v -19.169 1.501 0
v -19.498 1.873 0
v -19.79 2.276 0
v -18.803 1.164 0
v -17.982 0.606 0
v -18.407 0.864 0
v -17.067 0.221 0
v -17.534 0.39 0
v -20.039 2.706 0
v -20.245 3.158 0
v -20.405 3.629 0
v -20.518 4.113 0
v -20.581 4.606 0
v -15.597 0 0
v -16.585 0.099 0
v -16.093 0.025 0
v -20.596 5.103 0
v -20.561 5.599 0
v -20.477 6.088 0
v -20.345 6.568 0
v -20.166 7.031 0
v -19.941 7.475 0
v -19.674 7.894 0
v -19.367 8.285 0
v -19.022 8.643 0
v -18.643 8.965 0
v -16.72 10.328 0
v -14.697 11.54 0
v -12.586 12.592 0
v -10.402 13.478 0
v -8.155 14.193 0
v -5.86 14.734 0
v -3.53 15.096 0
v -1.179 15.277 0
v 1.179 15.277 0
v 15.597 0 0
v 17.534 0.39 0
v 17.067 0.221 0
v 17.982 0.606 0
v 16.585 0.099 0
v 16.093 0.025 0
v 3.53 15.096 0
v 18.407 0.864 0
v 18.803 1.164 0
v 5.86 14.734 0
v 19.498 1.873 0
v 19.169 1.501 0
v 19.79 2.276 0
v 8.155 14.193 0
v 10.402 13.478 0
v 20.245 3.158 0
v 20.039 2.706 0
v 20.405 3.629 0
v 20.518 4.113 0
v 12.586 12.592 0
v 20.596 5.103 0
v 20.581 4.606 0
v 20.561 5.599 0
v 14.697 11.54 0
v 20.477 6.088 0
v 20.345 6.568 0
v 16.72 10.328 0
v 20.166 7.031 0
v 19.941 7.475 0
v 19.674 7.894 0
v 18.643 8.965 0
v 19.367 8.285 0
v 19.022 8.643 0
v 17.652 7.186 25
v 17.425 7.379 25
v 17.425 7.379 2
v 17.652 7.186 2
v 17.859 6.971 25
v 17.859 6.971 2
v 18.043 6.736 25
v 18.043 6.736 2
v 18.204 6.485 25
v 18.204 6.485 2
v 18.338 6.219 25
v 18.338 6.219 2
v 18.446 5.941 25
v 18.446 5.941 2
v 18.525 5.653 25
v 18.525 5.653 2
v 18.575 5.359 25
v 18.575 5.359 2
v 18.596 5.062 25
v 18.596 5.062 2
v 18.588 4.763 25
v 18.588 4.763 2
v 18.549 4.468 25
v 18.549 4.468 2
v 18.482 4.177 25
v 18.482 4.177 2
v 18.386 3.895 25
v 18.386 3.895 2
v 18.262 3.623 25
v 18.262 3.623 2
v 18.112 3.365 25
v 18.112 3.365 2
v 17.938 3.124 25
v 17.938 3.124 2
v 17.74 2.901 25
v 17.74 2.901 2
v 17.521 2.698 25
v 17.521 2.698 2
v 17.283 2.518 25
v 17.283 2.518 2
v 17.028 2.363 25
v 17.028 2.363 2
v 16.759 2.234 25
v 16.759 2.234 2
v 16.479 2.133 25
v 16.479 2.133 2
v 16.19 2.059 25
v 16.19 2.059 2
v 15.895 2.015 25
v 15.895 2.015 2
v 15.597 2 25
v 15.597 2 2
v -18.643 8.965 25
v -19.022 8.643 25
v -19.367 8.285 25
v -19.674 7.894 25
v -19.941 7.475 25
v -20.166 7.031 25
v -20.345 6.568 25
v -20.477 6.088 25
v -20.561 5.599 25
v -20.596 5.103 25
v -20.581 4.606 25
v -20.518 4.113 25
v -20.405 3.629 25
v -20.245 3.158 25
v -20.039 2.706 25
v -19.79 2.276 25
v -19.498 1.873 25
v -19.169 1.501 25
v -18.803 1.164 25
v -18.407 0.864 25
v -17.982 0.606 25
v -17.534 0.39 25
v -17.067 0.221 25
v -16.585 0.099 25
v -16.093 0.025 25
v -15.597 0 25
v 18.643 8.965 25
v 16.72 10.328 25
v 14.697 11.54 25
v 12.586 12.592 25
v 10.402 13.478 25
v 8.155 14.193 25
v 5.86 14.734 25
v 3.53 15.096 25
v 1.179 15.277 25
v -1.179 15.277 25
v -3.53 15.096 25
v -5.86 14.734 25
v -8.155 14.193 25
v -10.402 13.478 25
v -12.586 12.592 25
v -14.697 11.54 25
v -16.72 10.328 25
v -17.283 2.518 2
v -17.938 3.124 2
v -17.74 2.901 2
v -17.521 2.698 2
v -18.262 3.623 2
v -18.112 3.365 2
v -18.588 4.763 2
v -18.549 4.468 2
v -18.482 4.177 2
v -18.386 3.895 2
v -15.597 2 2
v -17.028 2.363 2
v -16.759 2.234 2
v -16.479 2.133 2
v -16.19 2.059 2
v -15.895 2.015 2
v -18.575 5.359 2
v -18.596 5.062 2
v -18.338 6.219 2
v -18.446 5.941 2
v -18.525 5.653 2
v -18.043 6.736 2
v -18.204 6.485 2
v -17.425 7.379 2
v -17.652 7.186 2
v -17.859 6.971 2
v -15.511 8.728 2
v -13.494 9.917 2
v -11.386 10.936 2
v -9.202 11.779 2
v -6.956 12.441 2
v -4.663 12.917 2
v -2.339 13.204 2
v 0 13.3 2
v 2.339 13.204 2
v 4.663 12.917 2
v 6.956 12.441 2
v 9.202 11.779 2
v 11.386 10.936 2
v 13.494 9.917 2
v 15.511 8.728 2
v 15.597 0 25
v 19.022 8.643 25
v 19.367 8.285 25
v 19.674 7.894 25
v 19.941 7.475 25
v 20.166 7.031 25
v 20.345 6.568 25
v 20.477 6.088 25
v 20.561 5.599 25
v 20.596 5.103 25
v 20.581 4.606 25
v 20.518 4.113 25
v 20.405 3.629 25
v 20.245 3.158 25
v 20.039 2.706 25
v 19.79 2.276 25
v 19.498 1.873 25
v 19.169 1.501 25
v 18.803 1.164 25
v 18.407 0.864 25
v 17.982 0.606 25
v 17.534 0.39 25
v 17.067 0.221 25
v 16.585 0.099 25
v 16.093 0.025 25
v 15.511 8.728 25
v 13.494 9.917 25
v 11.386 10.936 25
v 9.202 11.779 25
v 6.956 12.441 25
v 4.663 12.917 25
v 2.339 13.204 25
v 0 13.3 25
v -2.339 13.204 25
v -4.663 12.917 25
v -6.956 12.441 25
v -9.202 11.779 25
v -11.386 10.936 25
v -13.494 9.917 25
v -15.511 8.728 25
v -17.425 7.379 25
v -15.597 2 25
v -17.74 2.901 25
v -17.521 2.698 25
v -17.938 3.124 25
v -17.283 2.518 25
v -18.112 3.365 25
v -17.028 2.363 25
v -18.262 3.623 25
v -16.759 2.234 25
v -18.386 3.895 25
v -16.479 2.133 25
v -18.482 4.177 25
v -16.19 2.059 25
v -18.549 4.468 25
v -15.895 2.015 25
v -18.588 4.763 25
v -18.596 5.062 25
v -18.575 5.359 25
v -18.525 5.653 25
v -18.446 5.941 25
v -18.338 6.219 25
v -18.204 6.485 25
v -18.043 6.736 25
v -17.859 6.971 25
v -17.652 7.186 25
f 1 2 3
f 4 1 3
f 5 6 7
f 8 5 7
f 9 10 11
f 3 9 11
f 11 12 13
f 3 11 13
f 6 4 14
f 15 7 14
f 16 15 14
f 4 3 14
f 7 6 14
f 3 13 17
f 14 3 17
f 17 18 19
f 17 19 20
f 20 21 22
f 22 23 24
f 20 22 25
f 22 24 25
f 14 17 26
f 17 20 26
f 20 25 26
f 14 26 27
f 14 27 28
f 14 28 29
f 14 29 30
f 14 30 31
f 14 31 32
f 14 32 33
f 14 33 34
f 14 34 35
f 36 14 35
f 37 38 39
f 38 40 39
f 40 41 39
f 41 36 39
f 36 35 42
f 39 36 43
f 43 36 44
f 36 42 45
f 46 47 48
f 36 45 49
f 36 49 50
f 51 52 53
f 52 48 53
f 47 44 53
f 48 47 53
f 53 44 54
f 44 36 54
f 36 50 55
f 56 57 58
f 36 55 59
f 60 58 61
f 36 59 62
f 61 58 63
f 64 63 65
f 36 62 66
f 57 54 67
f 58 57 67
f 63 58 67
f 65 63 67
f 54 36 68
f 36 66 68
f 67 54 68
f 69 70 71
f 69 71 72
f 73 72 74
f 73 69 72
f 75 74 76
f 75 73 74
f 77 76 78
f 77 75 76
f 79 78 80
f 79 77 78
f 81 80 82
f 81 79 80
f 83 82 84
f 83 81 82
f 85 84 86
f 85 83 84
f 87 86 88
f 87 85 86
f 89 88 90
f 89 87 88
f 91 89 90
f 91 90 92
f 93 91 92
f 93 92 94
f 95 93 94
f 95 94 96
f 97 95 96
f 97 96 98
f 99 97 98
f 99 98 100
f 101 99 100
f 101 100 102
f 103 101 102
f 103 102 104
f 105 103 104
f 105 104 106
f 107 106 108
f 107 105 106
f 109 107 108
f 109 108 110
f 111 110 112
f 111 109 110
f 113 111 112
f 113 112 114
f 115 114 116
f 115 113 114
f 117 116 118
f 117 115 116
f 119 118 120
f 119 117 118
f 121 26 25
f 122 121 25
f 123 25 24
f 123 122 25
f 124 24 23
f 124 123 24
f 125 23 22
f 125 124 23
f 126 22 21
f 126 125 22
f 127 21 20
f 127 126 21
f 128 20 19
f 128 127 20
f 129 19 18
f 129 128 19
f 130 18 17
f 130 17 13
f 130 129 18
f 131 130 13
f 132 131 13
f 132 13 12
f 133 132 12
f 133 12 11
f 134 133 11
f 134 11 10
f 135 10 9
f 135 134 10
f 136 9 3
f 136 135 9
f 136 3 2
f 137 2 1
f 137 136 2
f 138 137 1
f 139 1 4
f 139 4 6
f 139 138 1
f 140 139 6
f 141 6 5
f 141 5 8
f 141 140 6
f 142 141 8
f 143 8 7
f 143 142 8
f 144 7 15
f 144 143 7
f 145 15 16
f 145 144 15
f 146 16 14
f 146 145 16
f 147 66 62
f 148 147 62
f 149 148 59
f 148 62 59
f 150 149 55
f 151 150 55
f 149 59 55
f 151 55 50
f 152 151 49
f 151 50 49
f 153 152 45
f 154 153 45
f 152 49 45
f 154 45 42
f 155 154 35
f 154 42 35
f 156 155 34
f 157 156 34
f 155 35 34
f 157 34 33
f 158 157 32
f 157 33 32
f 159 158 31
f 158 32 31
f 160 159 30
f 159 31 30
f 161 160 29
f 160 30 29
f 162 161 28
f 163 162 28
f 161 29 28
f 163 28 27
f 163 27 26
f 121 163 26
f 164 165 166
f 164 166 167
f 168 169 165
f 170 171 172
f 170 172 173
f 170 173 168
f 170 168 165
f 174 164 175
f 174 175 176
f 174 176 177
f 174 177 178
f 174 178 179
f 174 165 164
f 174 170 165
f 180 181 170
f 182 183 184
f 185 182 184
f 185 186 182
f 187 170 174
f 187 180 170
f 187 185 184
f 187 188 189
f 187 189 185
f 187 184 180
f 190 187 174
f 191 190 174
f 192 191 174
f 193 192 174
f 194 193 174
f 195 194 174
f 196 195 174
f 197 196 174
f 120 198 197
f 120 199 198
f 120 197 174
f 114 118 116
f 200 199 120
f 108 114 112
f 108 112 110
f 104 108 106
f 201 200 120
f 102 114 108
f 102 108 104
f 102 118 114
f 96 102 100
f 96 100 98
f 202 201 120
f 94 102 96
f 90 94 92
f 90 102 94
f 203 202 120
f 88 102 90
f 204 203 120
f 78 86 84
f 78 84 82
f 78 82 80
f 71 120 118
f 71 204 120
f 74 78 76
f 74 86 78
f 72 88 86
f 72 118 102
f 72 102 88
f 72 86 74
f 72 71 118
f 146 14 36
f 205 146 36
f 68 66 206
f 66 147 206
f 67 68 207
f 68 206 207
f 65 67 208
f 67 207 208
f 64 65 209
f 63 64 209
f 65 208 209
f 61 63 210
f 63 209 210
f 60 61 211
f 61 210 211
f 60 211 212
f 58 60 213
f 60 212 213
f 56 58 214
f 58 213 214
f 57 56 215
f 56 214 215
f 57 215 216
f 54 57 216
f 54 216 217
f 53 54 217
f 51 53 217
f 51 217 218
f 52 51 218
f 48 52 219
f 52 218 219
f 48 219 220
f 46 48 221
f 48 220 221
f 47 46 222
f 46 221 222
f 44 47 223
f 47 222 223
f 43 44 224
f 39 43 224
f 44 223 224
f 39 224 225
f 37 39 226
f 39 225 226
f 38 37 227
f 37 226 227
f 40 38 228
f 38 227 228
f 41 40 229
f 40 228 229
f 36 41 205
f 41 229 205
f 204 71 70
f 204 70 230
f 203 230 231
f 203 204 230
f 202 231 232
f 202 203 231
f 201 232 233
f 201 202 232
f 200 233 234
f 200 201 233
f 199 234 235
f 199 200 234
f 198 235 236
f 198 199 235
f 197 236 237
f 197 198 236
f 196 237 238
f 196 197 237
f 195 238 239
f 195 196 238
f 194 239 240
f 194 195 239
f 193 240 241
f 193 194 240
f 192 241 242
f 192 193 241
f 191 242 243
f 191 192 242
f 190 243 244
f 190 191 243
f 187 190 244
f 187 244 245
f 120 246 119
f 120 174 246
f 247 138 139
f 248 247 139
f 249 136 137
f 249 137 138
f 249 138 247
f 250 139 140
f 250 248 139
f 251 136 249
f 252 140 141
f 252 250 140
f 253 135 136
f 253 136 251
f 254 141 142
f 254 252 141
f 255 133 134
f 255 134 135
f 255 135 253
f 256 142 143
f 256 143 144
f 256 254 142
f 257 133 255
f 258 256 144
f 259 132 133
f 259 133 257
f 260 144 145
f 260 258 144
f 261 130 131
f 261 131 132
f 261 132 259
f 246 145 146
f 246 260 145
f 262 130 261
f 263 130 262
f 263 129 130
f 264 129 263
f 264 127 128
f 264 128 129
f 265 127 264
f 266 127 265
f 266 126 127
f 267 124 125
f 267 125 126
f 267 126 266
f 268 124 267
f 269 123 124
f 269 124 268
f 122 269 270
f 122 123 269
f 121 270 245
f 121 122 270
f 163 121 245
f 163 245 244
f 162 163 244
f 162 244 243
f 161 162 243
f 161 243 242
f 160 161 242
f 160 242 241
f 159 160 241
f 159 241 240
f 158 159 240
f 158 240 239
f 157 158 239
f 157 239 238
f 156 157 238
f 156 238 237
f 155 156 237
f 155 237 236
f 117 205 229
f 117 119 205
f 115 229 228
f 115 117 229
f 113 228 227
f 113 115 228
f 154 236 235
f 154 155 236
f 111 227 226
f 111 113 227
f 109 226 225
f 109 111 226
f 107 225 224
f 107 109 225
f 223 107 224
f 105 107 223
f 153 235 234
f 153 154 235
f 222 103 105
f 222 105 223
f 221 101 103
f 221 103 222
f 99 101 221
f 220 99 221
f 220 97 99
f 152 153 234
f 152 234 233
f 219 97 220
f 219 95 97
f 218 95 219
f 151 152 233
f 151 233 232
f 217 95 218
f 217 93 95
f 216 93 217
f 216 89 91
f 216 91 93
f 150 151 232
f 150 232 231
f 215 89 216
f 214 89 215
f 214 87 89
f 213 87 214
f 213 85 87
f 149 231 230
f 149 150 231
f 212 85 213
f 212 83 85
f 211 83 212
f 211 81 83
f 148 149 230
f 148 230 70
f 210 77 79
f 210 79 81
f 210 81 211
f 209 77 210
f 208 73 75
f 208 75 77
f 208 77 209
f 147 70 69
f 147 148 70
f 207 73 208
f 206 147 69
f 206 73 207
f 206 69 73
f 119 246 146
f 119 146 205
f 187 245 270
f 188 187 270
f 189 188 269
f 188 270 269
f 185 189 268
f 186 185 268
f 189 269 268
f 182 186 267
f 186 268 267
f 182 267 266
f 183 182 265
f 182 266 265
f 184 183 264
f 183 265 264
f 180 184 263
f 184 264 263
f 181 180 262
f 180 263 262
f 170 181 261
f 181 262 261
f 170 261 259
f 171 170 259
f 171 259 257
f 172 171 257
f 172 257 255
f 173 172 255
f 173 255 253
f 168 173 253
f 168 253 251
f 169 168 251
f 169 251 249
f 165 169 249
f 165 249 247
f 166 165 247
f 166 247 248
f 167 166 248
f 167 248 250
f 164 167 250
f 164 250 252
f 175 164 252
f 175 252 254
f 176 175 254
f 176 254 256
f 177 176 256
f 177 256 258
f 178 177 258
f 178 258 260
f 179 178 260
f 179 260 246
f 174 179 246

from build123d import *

# Parameters (mm, degrees)
F1_DEPTH = 25
F2_R     = 5
F3_T     = -2


with BuildPart() as f1:
    # F0 (on Top) → F1 (new body)
    with BuildSketch(Plane.XY):
        with BuildLine():
            ThreePointArc((26.5, 0), (0, 15.3), (-26.5, 0))
            Line((-26.5, 0), (26.5, 0))
        make_face()
    extrude(amount=F1_DEPTH)

    # F2
    f2_edges = [f1.edges().sort_by_distance(p)[0] for p in [
        (-26.5, 0, 12.5),
        (26.5, 0, 12.5),
    ]]
    fillet(f2_edges, radius=F2_R)

    # F3
    f3_openings = [f1.faces().sort_by_distance(p)[0] for p in [
        (0, 6.722431, 25),
    ]]
    offset(amount=F3_T, openings=f3_openings)


solid = f1.part
